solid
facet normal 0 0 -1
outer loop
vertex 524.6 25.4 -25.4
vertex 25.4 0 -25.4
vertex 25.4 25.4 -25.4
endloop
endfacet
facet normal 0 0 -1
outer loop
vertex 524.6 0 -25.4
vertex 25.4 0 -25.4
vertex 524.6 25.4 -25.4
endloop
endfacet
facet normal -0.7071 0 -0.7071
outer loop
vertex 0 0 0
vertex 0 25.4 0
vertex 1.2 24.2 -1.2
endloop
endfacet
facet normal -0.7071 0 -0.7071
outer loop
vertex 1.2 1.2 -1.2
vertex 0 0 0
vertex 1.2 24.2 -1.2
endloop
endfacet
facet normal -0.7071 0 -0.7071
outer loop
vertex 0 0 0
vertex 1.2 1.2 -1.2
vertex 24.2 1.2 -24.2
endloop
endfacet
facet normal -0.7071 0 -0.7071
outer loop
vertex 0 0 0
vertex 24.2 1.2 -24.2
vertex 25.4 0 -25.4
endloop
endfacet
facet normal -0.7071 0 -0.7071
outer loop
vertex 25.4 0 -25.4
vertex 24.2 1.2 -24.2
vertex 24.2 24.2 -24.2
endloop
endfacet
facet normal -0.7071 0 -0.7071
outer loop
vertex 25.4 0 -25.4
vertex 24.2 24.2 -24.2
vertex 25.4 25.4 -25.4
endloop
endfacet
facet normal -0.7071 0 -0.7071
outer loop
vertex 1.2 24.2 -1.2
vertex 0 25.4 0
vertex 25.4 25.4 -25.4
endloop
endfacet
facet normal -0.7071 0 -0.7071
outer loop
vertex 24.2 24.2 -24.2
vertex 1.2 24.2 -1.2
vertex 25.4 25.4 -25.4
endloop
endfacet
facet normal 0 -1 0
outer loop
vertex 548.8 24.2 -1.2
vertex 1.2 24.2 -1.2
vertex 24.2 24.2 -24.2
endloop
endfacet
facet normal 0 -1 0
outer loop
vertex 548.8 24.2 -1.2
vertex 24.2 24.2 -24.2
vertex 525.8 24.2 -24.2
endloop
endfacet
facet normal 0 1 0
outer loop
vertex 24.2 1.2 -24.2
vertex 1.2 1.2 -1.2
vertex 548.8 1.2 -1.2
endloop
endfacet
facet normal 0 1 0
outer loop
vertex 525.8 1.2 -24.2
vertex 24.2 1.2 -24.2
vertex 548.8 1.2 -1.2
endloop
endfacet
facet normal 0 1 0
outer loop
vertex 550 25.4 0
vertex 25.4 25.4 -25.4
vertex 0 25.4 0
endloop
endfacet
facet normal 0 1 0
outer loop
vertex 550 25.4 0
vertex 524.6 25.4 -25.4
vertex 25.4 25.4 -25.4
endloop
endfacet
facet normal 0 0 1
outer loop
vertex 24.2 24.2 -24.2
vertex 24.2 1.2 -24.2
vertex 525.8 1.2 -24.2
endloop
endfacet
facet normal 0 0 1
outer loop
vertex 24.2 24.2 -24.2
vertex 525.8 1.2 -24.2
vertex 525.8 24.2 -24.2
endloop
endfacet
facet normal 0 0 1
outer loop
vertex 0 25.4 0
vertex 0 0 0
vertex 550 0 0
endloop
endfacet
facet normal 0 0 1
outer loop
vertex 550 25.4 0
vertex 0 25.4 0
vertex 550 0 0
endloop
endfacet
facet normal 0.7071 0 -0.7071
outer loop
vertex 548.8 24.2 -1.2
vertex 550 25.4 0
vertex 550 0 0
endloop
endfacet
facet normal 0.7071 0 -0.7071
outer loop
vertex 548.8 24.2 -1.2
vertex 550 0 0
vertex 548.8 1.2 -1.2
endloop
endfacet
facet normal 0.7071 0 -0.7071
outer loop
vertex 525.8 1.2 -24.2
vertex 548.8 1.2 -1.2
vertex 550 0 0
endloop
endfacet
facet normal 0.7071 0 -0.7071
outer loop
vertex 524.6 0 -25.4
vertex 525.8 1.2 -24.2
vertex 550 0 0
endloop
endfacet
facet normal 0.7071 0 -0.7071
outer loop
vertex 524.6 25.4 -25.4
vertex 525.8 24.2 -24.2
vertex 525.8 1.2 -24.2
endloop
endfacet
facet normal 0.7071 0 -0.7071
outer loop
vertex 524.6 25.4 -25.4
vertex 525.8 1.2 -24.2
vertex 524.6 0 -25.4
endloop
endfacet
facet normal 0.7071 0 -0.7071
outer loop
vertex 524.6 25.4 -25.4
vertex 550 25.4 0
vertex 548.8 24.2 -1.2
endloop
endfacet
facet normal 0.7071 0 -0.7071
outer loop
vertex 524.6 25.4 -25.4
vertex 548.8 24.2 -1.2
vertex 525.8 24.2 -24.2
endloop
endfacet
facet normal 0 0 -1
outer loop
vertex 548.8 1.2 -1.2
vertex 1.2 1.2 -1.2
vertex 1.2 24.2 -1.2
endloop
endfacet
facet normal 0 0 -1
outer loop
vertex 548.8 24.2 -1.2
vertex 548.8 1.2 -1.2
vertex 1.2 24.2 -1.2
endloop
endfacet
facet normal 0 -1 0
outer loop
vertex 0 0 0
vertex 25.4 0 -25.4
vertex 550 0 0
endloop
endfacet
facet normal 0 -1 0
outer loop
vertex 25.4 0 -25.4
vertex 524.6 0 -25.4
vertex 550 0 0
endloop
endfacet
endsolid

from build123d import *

# Parameters (mm, degrees)
SKETCH1_W           = 550
SKETCH1_H           = 25.4
BOSS_EXTRUDE1_DEPTH = 25.4
SKETCH2_W           = 23
SKETCH2_H           = 23
CUT_EXTRUDE1_DEPTH  = 550
CUT_EXTRUDE2_DEPTH  = 25.4


with BuildPart() as part:
    # Sketch1 → Boss-Extrude1 (new body)
    with BuildSketch(Plane(origin=(0, 0, 0), x_dir=(1, 0, 0), z_dir=(0, 1, 0))):
        with Locations((275, 12.7)):
            Rectangle(SKETCH1_W, SKETCH1_H)
    extrude(amount=BOSS_EXTRUDE1_DEPTH)

    # Sketch2 → Cut-Extrude1 (cut)
    with BuildSketch(Plane(origin=(550, 0, 0), x_dir=(0, 0, -1), z_dir=(1, 0, 0))):
        with Locations((12.7, 12.7)):
            Rectangle(SKETCH2_W, SKETCH2_H)
    extrude(amount=-CUT_EXTRUDE1_DEPTH, mode=Mode.SUBTRACT)

    # Sketch3 → Cut-Extrude2 (cut)
    with BuildSketch(Plane(origin=(0, 25.4, 0), x_dir=(1, 0, 0), z_dir=(0, 1, 0))):
        Polygon((0, 0), (25.4, 25.4), (0, 25.4), align=None)
        Polygon((550, 0), (524.6, 25.4), (550, 25.4), align=None)
    extrude(amount=-CUT_EXTRUDE2_DEPTH, mode=Mode.SUBTRACT)


solid = part.part
